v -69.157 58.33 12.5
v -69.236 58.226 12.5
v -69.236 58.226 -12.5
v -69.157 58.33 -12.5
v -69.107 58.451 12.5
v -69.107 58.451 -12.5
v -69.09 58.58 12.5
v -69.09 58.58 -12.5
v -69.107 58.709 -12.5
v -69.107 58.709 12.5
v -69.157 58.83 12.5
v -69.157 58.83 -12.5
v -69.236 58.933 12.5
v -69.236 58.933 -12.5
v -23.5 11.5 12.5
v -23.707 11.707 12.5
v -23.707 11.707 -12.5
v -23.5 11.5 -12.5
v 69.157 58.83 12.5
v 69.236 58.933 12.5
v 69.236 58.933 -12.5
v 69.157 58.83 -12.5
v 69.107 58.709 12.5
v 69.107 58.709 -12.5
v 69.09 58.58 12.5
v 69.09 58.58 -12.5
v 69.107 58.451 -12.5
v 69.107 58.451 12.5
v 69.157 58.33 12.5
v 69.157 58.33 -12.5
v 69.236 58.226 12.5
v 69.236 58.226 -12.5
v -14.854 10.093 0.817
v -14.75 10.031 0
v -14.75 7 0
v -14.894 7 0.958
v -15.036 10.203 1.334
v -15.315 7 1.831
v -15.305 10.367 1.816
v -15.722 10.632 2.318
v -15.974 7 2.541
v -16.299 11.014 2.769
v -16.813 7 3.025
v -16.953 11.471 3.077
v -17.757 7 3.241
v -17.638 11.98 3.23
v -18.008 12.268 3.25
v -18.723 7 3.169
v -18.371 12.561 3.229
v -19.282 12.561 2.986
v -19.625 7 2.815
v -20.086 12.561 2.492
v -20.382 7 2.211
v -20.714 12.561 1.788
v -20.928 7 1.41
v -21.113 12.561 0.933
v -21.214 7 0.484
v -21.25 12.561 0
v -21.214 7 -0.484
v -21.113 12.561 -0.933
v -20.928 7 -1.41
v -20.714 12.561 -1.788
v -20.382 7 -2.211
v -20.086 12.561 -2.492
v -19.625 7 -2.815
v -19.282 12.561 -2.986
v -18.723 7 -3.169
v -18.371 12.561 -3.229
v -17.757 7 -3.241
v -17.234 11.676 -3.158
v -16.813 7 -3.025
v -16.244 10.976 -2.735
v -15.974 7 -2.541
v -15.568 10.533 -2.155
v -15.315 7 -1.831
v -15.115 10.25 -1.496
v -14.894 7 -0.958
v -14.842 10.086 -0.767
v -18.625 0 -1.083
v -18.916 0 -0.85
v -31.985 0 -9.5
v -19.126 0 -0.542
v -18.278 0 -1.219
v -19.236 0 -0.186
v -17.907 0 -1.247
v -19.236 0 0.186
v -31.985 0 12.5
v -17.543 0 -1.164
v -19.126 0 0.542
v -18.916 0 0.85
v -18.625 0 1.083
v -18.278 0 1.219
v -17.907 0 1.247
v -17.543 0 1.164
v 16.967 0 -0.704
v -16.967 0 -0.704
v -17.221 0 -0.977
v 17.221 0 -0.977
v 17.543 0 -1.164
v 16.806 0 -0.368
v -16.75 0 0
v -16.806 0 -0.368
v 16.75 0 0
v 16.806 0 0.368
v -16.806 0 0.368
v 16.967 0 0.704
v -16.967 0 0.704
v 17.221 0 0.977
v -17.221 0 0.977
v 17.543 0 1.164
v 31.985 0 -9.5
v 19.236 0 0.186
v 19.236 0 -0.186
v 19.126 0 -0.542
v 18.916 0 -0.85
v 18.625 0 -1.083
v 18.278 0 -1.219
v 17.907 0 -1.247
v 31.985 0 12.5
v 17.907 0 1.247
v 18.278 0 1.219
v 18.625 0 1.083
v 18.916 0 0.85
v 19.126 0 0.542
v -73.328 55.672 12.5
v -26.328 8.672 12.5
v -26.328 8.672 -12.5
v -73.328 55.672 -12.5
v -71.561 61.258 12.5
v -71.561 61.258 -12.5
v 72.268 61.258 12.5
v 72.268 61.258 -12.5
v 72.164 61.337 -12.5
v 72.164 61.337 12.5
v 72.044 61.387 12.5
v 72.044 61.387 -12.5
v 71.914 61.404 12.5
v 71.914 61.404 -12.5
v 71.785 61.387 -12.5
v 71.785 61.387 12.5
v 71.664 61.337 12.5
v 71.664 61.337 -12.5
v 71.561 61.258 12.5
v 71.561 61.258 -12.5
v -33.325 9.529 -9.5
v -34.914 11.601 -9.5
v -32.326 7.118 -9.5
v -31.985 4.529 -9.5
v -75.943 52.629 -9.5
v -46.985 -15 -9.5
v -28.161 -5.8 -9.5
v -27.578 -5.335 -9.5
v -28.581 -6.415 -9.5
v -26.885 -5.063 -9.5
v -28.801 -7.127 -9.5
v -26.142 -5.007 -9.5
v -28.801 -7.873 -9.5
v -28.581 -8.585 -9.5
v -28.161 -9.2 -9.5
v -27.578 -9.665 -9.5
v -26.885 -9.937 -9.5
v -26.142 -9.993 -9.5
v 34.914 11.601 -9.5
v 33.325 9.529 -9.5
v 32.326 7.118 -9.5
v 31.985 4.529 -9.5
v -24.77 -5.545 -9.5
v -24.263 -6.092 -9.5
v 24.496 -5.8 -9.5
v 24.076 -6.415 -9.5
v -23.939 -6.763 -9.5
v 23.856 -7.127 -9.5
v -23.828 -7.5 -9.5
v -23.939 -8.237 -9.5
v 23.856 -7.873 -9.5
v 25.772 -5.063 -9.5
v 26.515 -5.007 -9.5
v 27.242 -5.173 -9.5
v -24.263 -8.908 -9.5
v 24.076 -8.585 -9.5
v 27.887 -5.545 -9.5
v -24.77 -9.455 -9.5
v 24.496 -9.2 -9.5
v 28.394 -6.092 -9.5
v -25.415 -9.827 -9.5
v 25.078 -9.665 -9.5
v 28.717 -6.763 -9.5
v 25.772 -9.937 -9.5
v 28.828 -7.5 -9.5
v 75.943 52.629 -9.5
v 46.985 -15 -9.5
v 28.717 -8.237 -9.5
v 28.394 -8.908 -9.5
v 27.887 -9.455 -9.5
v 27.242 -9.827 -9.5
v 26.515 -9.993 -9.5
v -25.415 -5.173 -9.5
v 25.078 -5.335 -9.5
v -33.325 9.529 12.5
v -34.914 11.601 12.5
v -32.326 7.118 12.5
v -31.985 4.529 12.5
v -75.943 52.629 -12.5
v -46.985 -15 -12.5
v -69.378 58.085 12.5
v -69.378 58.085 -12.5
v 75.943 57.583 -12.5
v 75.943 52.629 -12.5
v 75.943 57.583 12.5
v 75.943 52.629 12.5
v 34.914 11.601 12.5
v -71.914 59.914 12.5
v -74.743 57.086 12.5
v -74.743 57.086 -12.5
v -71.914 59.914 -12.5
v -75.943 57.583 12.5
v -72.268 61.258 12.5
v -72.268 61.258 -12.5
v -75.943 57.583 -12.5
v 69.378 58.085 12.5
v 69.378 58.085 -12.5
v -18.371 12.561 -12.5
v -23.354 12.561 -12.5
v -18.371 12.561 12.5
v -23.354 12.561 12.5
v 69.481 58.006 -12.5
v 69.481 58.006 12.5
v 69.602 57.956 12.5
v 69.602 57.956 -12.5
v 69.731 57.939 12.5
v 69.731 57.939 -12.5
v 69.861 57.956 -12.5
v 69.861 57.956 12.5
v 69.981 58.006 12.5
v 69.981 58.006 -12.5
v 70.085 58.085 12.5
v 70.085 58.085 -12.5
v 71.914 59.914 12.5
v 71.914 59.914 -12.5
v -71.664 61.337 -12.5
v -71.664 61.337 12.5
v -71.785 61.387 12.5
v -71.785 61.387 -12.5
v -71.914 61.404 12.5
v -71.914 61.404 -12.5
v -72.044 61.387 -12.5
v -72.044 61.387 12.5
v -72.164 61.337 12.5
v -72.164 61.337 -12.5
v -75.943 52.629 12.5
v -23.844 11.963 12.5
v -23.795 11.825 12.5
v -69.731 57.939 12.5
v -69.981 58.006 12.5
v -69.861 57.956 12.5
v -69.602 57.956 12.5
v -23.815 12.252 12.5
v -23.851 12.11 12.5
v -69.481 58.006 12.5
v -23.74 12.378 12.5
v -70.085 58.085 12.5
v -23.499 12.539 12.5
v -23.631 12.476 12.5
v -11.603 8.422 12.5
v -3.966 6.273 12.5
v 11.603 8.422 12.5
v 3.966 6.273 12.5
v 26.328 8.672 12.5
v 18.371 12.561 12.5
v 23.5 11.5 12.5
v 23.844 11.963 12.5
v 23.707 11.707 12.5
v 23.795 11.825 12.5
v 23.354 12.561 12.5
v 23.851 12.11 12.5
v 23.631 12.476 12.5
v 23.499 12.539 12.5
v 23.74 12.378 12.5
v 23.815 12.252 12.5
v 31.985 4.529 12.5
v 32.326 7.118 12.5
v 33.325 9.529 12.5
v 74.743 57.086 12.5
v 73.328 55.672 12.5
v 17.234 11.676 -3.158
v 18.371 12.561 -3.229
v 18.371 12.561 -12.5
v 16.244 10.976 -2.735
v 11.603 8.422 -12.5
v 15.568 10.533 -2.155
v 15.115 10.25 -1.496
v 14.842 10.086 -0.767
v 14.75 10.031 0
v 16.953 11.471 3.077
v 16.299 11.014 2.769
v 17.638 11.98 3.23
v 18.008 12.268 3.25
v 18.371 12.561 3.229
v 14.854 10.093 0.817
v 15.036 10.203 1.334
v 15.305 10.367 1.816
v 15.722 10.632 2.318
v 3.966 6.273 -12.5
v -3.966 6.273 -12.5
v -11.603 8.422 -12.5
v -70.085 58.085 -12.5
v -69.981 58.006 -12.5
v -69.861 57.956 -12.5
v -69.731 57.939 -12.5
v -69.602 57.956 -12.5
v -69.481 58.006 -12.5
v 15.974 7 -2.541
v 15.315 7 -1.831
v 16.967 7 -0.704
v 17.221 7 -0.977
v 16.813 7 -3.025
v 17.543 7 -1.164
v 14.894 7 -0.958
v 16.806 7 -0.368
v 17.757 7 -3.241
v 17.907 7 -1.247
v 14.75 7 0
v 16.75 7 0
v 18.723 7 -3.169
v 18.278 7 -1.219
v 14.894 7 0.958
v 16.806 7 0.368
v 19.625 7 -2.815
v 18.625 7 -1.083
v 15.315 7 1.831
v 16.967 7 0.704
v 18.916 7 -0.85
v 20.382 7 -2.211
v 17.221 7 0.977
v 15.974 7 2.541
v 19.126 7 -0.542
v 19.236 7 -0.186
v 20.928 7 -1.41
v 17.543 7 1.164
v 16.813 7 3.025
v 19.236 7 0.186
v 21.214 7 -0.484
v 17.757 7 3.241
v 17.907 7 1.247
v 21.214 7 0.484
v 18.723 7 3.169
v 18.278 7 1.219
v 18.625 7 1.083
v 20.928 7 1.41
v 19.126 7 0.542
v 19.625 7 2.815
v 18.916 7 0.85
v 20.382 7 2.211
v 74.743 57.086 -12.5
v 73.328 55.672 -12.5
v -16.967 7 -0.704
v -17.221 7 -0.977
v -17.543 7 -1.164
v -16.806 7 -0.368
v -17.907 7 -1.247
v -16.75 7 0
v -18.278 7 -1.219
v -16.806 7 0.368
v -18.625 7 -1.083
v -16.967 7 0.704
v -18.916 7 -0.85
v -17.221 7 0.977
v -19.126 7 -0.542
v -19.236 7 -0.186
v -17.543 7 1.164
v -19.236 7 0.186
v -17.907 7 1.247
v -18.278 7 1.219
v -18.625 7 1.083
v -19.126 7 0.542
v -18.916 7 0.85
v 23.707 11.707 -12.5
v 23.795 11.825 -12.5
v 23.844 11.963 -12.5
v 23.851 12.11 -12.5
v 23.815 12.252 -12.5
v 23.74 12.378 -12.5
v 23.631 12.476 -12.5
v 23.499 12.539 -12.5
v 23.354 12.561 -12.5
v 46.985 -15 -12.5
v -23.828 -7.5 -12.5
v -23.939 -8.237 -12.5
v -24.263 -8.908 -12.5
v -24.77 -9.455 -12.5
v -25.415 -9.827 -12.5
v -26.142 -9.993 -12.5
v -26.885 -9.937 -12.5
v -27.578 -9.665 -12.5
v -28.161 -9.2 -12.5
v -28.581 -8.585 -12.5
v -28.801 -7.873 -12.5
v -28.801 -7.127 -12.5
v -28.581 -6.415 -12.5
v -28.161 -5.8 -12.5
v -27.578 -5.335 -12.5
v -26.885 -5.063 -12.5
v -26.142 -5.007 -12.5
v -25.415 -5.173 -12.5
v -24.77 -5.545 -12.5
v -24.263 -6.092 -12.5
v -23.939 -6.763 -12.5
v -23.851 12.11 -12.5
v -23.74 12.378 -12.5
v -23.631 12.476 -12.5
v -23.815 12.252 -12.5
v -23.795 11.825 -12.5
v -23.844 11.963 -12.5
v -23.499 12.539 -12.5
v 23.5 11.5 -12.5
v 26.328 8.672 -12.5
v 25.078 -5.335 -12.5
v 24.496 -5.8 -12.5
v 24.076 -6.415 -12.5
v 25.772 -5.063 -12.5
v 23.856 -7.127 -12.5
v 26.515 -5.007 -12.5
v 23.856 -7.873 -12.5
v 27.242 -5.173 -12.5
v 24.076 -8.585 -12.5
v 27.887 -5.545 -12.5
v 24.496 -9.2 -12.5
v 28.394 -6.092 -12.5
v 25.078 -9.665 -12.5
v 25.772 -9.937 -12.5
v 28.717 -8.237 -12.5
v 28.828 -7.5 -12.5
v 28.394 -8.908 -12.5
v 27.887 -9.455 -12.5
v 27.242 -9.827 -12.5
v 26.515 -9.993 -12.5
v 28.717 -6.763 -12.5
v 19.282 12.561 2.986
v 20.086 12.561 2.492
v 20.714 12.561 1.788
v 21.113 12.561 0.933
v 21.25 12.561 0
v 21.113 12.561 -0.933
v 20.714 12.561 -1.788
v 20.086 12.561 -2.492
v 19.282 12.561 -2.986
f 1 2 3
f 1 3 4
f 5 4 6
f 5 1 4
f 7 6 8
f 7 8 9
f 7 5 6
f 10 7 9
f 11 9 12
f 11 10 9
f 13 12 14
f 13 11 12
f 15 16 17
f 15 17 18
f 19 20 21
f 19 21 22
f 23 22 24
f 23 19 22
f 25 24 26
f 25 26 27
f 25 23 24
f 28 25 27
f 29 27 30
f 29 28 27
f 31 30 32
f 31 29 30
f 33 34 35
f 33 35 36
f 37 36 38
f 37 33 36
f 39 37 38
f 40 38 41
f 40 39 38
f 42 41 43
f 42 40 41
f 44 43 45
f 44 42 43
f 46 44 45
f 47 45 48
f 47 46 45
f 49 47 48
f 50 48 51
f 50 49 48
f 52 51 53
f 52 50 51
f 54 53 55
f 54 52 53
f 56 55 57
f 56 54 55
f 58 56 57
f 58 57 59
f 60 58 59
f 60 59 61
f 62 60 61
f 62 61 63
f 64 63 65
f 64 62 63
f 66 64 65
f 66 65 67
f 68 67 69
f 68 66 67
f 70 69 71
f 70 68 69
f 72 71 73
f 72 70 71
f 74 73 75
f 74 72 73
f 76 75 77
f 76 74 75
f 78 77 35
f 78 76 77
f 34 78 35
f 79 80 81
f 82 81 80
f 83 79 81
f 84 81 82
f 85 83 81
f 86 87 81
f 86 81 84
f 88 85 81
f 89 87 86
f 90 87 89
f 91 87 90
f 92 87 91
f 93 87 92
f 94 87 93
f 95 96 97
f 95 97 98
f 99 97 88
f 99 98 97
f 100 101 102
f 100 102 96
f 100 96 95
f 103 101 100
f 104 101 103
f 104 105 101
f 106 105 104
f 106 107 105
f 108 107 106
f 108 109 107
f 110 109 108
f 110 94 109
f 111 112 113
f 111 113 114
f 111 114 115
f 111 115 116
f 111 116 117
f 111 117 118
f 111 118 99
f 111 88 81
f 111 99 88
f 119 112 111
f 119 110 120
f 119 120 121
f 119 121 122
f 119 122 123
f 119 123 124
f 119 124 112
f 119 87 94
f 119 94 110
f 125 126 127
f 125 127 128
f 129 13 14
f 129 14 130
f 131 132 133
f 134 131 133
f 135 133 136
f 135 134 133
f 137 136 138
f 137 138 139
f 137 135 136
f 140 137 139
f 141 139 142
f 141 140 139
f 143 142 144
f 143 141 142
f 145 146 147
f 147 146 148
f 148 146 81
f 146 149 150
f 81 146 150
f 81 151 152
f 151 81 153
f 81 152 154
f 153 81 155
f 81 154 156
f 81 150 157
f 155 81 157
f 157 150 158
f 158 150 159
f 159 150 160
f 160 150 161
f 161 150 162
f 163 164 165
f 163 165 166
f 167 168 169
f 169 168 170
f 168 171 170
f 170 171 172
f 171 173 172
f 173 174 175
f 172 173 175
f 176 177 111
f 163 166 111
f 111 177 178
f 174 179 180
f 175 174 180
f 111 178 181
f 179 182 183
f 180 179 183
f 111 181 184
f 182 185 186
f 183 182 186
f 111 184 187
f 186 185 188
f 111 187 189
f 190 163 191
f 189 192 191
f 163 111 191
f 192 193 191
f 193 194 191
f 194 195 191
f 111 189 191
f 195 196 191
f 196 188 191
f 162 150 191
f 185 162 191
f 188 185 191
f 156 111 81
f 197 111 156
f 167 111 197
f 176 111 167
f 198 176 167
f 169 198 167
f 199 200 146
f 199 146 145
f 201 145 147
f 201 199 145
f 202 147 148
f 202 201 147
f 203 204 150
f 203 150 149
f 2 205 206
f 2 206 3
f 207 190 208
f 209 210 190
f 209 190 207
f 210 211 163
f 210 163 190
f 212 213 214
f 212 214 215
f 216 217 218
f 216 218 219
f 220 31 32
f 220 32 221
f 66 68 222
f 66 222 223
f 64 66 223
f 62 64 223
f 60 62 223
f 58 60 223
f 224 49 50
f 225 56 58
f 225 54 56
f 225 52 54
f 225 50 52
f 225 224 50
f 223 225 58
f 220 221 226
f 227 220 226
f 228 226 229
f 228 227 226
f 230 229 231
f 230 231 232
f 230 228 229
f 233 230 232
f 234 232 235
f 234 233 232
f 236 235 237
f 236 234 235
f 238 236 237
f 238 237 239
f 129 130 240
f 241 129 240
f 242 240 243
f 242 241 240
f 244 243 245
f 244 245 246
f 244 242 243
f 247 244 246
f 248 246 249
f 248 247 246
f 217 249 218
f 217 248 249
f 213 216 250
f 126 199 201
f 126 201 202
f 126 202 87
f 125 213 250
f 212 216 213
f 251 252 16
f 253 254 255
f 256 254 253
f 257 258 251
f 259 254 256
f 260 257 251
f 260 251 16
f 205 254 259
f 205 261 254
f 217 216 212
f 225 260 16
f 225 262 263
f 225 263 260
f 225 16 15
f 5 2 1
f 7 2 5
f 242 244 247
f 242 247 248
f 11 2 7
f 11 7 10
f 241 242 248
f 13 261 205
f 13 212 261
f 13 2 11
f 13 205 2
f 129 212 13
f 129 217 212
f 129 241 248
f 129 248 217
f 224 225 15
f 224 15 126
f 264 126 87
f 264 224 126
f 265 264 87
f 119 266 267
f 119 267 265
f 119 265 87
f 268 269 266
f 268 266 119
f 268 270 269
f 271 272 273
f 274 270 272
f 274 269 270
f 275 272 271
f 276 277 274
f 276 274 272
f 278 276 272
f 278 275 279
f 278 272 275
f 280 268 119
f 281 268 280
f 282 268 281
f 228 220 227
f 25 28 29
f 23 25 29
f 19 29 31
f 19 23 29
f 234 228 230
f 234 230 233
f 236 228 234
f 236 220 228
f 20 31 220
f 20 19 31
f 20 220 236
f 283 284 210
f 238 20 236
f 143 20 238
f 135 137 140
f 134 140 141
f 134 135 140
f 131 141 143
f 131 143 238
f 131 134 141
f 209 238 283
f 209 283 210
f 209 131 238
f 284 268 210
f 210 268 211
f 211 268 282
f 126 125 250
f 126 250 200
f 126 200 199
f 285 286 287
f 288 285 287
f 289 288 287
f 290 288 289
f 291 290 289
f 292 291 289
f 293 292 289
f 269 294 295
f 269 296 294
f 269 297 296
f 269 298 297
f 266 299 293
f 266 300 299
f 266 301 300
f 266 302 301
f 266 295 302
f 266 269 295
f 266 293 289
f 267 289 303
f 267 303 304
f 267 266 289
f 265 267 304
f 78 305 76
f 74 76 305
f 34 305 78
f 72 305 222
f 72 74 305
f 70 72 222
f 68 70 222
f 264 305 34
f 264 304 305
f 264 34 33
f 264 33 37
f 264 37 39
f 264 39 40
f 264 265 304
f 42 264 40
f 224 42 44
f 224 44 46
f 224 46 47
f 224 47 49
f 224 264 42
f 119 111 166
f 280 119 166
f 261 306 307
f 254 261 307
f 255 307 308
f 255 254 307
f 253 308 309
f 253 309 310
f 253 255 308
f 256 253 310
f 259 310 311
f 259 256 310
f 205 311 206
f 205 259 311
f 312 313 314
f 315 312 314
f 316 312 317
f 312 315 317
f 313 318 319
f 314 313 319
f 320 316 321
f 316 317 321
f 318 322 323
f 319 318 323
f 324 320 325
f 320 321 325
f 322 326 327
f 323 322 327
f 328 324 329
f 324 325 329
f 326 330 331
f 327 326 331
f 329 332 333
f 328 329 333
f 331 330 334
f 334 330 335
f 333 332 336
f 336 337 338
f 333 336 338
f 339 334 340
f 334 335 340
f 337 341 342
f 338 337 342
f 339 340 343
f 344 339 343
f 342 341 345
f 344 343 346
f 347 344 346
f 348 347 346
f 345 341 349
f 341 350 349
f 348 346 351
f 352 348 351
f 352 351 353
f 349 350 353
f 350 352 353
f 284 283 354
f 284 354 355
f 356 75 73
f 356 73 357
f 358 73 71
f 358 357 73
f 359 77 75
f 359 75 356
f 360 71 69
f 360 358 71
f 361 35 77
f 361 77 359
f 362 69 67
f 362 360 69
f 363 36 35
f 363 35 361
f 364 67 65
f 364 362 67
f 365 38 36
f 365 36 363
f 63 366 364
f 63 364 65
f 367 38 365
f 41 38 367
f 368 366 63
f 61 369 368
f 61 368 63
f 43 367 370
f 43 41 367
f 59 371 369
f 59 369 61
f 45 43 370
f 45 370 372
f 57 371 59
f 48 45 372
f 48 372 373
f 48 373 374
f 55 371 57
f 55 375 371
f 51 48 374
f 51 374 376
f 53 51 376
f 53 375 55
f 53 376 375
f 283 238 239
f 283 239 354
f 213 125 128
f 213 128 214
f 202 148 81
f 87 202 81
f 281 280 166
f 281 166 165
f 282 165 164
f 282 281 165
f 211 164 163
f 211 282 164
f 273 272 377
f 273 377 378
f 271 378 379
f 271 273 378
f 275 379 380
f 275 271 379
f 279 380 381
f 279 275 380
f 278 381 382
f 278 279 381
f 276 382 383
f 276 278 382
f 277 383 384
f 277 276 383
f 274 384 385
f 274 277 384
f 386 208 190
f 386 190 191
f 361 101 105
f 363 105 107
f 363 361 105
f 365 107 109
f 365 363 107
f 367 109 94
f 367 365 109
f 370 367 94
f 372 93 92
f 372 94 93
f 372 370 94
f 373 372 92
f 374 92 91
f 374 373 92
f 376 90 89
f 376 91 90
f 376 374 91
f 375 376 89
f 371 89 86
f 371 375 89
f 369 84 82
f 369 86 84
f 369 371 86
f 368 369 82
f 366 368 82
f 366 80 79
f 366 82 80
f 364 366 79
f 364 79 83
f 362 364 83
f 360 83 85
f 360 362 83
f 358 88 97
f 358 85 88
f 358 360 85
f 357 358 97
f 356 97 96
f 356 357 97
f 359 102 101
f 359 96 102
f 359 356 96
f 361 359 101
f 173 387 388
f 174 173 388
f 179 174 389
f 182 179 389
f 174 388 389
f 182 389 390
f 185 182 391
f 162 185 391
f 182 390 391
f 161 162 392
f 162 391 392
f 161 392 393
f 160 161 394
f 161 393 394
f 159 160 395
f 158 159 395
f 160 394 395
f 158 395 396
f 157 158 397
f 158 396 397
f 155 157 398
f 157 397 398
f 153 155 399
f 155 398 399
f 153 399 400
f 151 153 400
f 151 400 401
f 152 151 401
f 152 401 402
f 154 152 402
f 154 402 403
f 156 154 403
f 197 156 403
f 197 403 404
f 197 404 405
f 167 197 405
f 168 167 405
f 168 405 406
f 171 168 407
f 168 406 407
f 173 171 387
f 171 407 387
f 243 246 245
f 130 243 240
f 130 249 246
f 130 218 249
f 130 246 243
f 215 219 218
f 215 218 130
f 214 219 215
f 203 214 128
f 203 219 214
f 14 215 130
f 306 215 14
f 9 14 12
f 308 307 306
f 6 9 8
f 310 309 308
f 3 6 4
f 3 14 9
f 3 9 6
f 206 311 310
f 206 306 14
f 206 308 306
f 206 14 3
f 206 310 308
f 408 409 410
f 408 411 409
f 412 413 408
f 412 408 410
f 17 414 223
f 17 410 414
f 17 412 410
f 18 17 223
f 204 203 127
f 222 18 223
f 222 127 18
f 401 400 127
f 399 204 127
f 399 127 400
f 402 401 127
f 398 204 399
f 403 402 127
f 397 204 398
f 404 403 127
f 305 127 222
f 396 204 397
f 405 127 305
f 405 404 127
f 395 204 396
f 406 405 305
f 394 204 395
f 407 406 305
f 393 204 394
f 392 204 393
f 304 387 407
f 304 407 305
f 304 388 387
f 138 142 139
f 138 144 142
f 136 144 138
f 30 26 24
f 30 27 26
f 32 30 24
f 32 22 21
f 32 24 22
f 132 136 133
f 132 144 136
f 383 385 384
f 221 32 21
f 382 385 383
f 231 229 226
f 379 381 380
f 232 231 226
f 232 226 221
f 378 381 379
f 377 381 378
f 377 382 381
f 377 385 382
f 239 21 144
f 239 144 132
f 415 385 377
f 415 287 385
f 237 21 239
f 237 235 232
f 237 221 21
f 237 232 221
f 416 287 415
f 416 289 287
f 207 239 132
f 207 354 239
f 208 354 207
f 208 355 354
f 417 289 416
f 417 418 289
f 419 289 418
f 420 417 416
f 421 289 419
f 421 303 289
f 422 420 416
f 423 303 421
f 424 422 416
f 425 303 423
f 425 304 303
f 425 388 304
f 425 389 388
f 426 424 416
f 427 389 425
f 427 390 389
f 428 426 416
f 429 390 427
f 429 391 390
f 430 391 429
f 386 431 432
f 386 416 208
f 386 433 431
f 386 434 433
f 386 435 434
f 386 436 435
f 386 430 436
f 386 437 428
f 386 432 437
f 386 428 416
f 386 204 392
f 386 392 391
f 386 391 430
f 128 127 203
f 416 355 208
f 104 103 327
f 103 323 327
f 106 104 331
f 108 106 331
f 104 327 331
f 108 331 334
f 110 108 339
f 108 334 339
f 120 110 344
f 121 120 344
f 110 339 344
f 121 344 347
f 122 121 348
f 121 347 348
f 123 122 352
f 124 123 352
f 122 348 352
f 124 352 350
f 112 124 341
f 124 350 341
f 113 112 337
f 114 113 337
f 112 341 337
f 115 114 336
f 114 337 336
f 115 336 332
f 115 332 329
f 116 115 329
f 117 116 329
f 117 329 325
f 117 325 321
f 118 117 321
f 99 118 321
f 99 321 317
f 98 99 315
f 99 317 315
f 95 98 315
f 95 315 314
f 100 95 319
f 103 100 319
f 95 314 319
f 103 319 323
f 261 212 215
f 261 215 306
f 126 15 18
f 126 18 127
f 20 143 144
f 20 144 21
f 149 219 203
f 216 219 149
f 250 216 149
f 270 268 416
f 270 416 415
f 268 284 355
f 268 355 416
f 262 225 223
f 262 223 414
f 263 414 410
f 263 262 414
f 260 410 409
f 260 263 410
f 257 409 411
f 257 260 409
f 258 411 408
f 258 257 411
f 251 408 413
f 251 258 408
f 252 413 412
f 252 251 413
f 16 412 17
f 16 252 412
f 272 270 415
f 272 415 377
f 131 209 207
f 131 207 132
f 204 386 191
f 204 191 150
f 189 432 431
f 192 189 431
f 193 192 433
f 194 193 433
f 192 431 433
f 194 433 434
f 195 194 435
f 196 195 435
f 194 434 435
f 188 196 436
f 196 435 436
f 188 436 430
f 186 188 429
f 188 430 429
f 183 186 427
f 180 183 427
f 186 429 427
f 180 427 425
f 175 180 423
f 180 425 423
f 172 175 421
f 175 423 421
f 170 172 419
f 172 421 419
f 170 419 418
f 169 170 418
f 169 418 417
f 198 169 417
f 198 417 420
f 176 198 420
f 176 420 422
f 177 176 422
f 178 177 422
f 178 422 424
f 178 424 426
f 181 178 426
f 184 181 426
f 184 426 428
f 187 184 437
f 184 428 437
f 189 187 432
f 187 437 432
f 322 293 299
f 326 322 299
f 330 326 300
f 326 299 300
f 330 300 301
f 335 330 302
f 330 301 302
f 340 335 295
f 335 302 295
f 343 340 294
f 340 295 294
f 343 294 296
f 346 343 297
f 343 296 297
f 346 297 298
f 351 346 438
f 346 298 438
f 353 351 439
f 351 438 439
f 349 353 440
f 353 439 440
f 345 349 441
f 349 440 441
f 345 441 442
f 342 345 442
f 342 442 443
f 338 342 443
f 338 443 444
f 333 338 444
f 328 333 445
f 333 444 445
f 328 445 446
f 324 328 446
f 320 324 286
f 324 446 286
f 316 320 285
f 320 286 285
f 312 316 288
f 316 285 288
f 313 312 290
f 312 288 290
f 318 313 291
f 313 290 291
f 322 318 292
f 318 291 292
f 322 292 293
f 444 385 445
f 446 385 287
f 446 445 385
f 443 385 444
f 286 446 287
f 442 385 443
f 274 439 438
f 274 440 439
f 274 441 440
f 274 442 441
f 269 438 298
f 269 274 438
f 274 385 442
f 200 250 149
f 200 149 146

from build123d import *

# Parameters (mm, degrees)
F1_DEPTH = 12.5
F6_R     = 2.5
F7_DEPTH = 3


with BuildPart() as f1:
    # F0 (on Top) → F1 (new body, symmetric)
    with BuildSketch(Plane.XY):
        with BuildLine():
            Line((0, 0), (31.985281, 0))
            Line((31.985281, 0), (31.985281, 4.529437))
            ThreePointArc((31.985281, 4.529437), (32.746486, 8.356272), (34.914214, 11.600505))
            Line((34.914214, 11.600505), (75.942641, 52.628932))
            Line((75.942641, 52.628932), (75.942641, 57.582843))
            Line((75.942641, 57.582843), (72.267767, 61.257716))
            ThreePointArc((72.267767, 61.257716), (71.914214, 61.404163), (71.56066, 61.257716))
            Line((71.56066, 61.257716), (69.236437, 58.933493))
            ThreePointArc((69.236437, 58.933493), (69.08999, 58.57994), (69.236437, 58.226386))
            Line((69.236437, 58.226386), (69.377858, 58.084965))
            ThreePointArc((69.377858, 58.084965), (69.731411, 57.938518), (70.084965, 58.084965))
            Line((70.084965, 58.084965), (70.5, 58.5))
            Line((70.5, 58.5), (71.914214, 59.914214))
            Line((71.914214, 59.914214), (74.742641, 57.085786))
            Line((74.742641, 57.085786), (73.328427, 55.671573))
            Line((73.328427, 55.671573), (26.328427, 8.671573))
            Line((26.328427, 8.671573), (23.5, 11.5))
            Line((23.5, 11.5), (23.707107, 11.707107))
            ThreePointArc((23.707107, 11.707107), (23.815493, 12.252002), (23.353553, 12.56066))
            Line((23.353553, 12.56066), (18.370521, 12.56066))
            ThreePointArc((18.370521, 12.56066), (0, 6), (-18.370521, 12.56066))
            Line((-18.370521, 12.56066), (-23.353553, 12.56066))
            ThreePointArc((-23.353553, 12.56066), (-23.815493, 12.252002), (-23.707107, 11.707107))
            Line((-23.707107, 11.707107), (-23.5, 11.5))
            Line((-23.5, 11.5), (-26.328427, 8.671573))
            Line((-26.328427, 8.671573), (-73.328427, 55.671573))
            Line((-73.328427, 55.671573), (-74.742641, 57.085786))
            Line((-74.742641, 57.085786), (-71.914214, 59.914214))
            Line((-71.914214, 59.914214), (-70.5, 58.5))
            Line((-70.5, 58.5), (-70.084965, 58.084965))
            ThreePointArc((-70.084965, 58.084965), (-69.731411, 57.938518), (-69.377858, 58.084965))
            Line((-69.377858, 58.084965), (-69.236437, 58.226386))
            ThreePointArc((-69.236437, 58.226386), (-69.08999, 58.57994), (-69.236437, 58.933493))
            Line((-69.236437, 58.933493), (-71.56066, 61.257716))
            ThreePointArc((-71.56066, 61.257716), (-71.914214, 61.404163), (-72.267767, 61.257716))
            Line((-72.267767, 61.257716), (-75.942641, 57.582843))
            Line((-75.942641, 57.582843), (-75.942641, 52.628932))
            Line((-75.942641, 52.628932), (-34.914214, 11.600505))
            ThreePointArc((-34.914214, 11.600505), (-32.746486, 8.356272), (-31.985281, 4.529437))
            Line((-31.985281, 4.529437), (-31.985281, 0))
            Line((-31.985281, 0), (0, 0))
        make_face()
    extrude(amount=F1_DEPTH, both=True)


with BuildPart() as f3:
    # F2 (on Top) → F3 (revolve)
    with BuildSketch(Plane.XY):
        Polygon((-18, 19.219435), (-18, -4.799377), (-16.75, -4.799377), (-16.75, 7), (-14.75, 7), (-14.75, 19.219435), align=None)
    revolve(axis=Axis((-18, 7.210029, 0), (0, -1, 0)))


with BuildPart() as f4_1:
    # F4: instance of F3
    add(f3.part.mirror(Plane.YZ))


with BuildPart() as f1_1:
    add(f1.part)

    # F5: cut F3, F4_1
    add(f3.part, mode=Mode.SUBTRACT)
    add(f4_1.part, mode=Mode.SUBTRACT)

    # F6 (on face) → F7 (join)
    with BuildSketch(Plane(origin=(0, 0, -12.5), x_dir=(1, 0, 0), z_dir=(0, 0, -1))):
        Polygon((46.985281, 15), (0, 15), (0, 0), (23.313708, 0), (75.942641, -52.628932), align=None)
        with Locations((26.328427, 7.5)):
            Circle(F6_R, mode=Mode.SUBTRACT)
        Polygon((0, 0), (0, 15), (-46.985281, 15), (-75.942641, -52.628932), (-23.313708, 0), align=None)
        with Locations((-26.328427, 7.5)):
            Circle(F6_R, mode=Mode.SUBTRACT)
    extrude(amount=-F7_DEPTH)


solid = f1_1.part
